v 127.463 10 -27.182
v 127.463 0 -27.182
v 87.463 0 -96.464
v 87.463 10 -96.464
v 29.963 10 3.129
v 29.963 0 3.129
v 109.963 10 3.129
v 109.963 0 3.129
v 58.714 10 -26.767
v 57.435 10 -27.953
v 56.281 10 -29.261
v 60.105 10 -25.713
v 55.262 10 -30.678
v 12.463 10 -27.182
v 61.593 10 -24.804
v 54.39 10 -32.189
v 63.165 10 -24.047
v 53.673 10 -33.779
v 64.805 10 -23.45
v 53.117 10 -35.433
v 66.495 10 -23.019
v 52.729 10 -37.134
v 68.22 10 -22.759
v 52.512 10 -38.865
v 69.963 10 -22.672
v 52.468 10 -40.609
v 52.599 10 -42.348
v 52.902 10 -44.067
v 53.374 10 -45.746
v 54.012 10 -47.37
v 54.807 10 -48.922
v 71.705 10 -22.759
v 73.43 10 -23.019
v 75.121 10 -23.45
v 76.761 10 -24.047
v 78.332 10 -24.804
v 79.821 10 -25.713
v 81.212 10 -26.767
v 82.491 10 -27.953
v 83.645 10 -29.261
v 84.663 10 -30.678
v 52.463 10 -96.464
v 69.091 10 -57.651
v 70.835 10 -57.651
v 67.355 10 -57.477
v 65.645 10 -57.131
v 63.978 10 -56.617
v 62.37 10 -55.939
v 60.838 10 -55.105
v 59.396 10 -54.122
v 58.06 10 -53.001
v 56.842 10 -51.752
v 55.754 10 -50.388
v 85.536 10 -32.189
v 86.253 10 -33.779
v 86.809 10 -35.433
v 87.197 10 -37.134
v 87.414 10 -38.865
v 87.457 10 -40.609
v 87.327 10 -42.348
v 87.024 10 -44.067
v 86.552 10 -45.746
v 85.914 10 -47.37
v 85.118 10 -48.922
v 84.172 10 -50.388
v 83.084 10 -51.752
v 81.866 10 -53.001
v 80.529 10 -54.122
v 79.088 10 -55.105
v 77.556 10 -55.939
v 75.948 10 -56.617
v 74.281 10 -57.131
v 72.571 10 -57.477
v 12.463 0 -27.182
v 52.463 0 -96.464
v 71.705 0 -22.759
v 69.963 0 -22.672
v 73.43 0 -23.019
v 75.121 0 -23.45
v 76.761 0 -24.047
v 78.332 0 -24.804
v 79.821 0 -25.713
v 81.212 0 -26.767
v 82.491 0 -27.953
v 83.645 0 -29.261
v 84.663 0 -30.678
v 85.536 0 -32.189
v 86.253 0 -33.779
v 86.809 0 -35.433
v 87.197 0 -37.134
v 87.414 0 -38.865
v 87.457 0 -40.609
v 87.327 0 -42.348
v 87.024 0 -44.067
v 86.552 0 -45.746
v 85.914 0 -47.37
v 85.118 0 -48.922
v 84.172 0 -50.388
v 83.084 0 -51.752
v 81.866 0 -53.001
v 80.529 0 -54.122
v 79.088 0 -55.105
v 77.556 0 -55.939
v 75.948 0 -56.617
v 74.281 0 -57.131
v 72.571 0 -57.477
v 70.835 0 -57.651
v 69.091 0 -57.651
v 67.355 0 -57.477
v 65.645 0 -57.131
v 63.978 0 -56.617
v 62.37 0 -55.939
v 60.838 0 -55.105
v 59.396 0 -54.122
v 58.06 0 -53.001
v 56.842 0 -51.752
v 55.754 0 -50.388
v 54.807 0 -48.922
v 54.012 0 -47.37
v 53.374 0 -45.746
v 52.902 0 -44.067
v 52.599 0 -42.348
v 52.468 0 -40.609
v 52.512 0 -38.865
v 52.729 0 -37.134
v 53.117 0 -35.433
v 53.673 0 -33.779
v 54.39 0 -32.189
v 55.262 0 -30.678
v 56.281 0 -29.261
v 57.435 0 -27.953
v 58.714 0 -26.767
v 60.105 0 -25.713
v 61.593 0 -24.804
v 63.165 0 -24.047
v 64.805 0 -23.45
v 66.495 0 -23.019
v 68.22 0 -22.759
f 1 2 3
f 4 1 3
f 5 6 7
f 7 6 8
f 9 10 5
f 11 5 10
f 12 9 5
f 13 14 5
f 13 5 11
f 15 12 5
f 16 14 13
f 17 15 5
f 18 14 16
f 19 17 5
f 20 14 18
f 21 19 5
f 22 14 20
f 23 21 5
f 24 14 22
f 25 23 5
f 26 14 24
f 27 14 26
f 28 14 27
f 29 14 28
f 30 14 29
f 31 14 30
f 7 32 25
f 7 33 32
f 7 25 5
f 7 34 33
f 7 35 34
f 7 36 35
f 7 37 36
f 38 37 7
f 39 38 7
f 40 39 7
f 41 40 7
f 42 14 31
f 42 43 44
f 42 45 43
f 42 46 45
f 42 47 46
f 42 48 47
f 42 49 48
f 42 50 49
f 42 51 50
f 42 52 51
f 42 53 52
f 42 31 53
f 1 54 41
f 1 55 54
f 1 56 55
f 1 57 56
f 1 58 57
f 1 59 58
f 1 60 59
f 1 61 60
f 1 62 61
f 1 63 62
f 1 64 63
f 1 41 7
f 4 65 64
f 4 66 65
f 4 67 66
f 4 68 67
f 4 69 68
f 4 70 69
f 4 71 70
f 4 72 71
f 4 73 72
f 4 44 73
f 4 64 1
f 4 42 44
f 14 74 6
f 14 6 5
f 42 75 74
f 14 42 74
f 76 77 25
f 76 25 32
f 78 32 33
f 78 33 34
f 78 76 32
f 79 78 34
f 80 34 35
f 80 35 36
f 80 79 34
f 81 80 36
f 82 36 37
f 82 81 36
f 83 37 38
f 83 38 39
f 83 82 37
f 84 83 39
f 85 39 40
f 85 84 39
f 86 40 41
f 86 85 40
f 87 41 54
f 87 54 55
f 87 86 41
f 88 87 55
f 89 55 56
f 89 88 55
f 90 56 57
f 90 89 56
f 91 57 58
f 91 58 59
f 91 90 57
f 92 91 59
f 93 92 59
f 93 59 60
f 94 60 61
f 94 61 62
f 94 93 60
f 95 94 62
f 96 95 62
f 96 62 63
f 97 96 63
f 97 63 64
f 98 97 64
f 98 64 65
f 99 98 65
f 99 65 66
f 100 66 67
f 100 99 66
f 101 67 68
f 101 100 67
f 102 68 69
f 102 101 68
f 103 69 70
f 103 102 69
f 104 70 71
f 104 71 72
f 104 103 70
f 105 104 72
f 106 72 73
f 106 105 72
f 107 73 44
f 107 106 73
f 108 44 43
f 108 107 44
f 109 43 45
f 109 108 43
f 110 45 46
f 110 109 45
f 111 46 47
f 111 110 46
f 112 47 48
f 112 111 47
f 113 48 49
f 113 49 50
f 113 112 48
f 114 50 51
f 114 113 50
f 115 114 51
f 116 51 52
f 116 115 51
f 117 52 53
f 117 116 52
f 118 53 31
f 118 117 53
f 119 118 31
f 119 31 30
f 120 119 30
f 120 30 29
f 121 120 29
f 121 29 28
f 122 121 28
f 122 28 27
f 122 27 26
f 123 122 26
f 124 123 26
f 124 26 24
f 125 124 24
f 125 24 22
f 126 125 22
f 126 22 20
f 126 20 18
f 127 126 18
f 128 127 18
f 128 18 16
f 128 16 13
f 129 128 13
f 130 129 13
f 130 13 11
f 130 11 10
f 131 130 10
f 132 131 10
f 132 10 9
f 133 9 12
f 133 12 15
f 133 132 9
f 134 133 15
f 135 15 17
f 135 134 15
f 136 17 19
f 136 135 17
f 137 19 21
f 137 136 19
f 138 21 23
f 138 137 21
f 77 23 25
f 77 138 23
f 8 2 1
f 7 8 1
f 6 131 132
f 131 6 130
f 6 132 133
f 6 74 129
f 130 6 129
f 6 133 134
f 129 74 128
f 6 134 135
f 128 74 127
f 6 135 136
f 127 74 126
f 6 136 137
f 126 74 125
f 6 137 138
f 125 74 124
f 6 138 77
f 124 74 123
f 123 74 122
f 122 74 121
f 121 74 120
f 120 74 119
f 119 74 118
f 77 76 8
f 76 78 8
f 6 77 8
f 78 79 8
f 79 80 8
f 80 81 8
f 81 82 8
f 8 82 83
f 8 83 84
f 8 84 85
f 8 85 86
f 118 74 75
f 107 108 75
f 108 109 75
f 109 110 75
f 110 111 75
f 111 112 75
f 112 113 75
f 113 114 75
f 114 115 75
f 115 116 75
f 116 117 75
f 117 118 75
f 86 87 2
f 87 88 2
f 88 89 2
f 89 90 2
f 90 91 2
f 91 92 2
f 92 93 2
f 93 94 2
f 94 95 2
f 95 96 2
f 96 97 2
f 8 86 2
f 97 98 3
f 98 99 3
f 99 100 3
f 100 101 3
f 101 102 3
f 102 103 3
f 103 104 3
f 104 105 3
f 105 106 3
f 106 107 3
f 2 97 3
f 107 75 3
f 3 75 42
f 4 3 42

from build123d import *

# Parameters (mm, degrees)
SKETCH1_R            = 17.5
BOSS_EXTRUDE1_DEPTH  = 10
CHAMFER1_SIZE        = 35
CHAMFER1_EDGE_2_SIZE = 35
CHAMFER1_EDGE_3_SIZE = 35


with BuildPart() as part:
    # Sketch1 → Boss-Extrude1 (new body)
    with BuildSketch(Plane(origin=(0, 0, 0), x_dir=(1, 0, 0), z_dir=(0, 1, 0))):
        Polygon((-5.037101102, -3.128878012), (144.962898898, -3.128878012), (69.962898898, 126.774932556), align=None)
        with Locations(Location((69.962898898, 40.172392178, 0), (0, 0, 270))):
            Circle(SKETCH1_R, mode=Mode.SUBTRACT)
    extrude(amount=BOSS_EXTRUDE1_DEPTH)

    # Chamfer1
    chamfer1_edges = [part.edges().sort_by_distance(p)[0] for p in [
        (69.962898898, 5, -126.774932556),
    ]]
    chamfer(chamfer1_edges, length=CHAMFER1_SIZE)

    # Chamfer1 edge 2
    chamfer1_edge_2_edges = [part.edges().sort_by_distance(p)[0] for p in [
        (144.962898898, 5, 3.128878012),
    ]]
    chamfer(chamfer1_edge_2_edges, length=CHAMFER1_EDGE_2_SIZE)

    # Chamfer1 edge 3
    chamfer1_edge_3_edges = [part.edges().sort_by_distance(p)[0] for p in [
        (-5.037101102, 5, 3.128878012),
    ]]
    chamfer(chamfer1_edge_3_edges, length=CHAMFER1_EDGE_3_SIZE)


solid = part.part
